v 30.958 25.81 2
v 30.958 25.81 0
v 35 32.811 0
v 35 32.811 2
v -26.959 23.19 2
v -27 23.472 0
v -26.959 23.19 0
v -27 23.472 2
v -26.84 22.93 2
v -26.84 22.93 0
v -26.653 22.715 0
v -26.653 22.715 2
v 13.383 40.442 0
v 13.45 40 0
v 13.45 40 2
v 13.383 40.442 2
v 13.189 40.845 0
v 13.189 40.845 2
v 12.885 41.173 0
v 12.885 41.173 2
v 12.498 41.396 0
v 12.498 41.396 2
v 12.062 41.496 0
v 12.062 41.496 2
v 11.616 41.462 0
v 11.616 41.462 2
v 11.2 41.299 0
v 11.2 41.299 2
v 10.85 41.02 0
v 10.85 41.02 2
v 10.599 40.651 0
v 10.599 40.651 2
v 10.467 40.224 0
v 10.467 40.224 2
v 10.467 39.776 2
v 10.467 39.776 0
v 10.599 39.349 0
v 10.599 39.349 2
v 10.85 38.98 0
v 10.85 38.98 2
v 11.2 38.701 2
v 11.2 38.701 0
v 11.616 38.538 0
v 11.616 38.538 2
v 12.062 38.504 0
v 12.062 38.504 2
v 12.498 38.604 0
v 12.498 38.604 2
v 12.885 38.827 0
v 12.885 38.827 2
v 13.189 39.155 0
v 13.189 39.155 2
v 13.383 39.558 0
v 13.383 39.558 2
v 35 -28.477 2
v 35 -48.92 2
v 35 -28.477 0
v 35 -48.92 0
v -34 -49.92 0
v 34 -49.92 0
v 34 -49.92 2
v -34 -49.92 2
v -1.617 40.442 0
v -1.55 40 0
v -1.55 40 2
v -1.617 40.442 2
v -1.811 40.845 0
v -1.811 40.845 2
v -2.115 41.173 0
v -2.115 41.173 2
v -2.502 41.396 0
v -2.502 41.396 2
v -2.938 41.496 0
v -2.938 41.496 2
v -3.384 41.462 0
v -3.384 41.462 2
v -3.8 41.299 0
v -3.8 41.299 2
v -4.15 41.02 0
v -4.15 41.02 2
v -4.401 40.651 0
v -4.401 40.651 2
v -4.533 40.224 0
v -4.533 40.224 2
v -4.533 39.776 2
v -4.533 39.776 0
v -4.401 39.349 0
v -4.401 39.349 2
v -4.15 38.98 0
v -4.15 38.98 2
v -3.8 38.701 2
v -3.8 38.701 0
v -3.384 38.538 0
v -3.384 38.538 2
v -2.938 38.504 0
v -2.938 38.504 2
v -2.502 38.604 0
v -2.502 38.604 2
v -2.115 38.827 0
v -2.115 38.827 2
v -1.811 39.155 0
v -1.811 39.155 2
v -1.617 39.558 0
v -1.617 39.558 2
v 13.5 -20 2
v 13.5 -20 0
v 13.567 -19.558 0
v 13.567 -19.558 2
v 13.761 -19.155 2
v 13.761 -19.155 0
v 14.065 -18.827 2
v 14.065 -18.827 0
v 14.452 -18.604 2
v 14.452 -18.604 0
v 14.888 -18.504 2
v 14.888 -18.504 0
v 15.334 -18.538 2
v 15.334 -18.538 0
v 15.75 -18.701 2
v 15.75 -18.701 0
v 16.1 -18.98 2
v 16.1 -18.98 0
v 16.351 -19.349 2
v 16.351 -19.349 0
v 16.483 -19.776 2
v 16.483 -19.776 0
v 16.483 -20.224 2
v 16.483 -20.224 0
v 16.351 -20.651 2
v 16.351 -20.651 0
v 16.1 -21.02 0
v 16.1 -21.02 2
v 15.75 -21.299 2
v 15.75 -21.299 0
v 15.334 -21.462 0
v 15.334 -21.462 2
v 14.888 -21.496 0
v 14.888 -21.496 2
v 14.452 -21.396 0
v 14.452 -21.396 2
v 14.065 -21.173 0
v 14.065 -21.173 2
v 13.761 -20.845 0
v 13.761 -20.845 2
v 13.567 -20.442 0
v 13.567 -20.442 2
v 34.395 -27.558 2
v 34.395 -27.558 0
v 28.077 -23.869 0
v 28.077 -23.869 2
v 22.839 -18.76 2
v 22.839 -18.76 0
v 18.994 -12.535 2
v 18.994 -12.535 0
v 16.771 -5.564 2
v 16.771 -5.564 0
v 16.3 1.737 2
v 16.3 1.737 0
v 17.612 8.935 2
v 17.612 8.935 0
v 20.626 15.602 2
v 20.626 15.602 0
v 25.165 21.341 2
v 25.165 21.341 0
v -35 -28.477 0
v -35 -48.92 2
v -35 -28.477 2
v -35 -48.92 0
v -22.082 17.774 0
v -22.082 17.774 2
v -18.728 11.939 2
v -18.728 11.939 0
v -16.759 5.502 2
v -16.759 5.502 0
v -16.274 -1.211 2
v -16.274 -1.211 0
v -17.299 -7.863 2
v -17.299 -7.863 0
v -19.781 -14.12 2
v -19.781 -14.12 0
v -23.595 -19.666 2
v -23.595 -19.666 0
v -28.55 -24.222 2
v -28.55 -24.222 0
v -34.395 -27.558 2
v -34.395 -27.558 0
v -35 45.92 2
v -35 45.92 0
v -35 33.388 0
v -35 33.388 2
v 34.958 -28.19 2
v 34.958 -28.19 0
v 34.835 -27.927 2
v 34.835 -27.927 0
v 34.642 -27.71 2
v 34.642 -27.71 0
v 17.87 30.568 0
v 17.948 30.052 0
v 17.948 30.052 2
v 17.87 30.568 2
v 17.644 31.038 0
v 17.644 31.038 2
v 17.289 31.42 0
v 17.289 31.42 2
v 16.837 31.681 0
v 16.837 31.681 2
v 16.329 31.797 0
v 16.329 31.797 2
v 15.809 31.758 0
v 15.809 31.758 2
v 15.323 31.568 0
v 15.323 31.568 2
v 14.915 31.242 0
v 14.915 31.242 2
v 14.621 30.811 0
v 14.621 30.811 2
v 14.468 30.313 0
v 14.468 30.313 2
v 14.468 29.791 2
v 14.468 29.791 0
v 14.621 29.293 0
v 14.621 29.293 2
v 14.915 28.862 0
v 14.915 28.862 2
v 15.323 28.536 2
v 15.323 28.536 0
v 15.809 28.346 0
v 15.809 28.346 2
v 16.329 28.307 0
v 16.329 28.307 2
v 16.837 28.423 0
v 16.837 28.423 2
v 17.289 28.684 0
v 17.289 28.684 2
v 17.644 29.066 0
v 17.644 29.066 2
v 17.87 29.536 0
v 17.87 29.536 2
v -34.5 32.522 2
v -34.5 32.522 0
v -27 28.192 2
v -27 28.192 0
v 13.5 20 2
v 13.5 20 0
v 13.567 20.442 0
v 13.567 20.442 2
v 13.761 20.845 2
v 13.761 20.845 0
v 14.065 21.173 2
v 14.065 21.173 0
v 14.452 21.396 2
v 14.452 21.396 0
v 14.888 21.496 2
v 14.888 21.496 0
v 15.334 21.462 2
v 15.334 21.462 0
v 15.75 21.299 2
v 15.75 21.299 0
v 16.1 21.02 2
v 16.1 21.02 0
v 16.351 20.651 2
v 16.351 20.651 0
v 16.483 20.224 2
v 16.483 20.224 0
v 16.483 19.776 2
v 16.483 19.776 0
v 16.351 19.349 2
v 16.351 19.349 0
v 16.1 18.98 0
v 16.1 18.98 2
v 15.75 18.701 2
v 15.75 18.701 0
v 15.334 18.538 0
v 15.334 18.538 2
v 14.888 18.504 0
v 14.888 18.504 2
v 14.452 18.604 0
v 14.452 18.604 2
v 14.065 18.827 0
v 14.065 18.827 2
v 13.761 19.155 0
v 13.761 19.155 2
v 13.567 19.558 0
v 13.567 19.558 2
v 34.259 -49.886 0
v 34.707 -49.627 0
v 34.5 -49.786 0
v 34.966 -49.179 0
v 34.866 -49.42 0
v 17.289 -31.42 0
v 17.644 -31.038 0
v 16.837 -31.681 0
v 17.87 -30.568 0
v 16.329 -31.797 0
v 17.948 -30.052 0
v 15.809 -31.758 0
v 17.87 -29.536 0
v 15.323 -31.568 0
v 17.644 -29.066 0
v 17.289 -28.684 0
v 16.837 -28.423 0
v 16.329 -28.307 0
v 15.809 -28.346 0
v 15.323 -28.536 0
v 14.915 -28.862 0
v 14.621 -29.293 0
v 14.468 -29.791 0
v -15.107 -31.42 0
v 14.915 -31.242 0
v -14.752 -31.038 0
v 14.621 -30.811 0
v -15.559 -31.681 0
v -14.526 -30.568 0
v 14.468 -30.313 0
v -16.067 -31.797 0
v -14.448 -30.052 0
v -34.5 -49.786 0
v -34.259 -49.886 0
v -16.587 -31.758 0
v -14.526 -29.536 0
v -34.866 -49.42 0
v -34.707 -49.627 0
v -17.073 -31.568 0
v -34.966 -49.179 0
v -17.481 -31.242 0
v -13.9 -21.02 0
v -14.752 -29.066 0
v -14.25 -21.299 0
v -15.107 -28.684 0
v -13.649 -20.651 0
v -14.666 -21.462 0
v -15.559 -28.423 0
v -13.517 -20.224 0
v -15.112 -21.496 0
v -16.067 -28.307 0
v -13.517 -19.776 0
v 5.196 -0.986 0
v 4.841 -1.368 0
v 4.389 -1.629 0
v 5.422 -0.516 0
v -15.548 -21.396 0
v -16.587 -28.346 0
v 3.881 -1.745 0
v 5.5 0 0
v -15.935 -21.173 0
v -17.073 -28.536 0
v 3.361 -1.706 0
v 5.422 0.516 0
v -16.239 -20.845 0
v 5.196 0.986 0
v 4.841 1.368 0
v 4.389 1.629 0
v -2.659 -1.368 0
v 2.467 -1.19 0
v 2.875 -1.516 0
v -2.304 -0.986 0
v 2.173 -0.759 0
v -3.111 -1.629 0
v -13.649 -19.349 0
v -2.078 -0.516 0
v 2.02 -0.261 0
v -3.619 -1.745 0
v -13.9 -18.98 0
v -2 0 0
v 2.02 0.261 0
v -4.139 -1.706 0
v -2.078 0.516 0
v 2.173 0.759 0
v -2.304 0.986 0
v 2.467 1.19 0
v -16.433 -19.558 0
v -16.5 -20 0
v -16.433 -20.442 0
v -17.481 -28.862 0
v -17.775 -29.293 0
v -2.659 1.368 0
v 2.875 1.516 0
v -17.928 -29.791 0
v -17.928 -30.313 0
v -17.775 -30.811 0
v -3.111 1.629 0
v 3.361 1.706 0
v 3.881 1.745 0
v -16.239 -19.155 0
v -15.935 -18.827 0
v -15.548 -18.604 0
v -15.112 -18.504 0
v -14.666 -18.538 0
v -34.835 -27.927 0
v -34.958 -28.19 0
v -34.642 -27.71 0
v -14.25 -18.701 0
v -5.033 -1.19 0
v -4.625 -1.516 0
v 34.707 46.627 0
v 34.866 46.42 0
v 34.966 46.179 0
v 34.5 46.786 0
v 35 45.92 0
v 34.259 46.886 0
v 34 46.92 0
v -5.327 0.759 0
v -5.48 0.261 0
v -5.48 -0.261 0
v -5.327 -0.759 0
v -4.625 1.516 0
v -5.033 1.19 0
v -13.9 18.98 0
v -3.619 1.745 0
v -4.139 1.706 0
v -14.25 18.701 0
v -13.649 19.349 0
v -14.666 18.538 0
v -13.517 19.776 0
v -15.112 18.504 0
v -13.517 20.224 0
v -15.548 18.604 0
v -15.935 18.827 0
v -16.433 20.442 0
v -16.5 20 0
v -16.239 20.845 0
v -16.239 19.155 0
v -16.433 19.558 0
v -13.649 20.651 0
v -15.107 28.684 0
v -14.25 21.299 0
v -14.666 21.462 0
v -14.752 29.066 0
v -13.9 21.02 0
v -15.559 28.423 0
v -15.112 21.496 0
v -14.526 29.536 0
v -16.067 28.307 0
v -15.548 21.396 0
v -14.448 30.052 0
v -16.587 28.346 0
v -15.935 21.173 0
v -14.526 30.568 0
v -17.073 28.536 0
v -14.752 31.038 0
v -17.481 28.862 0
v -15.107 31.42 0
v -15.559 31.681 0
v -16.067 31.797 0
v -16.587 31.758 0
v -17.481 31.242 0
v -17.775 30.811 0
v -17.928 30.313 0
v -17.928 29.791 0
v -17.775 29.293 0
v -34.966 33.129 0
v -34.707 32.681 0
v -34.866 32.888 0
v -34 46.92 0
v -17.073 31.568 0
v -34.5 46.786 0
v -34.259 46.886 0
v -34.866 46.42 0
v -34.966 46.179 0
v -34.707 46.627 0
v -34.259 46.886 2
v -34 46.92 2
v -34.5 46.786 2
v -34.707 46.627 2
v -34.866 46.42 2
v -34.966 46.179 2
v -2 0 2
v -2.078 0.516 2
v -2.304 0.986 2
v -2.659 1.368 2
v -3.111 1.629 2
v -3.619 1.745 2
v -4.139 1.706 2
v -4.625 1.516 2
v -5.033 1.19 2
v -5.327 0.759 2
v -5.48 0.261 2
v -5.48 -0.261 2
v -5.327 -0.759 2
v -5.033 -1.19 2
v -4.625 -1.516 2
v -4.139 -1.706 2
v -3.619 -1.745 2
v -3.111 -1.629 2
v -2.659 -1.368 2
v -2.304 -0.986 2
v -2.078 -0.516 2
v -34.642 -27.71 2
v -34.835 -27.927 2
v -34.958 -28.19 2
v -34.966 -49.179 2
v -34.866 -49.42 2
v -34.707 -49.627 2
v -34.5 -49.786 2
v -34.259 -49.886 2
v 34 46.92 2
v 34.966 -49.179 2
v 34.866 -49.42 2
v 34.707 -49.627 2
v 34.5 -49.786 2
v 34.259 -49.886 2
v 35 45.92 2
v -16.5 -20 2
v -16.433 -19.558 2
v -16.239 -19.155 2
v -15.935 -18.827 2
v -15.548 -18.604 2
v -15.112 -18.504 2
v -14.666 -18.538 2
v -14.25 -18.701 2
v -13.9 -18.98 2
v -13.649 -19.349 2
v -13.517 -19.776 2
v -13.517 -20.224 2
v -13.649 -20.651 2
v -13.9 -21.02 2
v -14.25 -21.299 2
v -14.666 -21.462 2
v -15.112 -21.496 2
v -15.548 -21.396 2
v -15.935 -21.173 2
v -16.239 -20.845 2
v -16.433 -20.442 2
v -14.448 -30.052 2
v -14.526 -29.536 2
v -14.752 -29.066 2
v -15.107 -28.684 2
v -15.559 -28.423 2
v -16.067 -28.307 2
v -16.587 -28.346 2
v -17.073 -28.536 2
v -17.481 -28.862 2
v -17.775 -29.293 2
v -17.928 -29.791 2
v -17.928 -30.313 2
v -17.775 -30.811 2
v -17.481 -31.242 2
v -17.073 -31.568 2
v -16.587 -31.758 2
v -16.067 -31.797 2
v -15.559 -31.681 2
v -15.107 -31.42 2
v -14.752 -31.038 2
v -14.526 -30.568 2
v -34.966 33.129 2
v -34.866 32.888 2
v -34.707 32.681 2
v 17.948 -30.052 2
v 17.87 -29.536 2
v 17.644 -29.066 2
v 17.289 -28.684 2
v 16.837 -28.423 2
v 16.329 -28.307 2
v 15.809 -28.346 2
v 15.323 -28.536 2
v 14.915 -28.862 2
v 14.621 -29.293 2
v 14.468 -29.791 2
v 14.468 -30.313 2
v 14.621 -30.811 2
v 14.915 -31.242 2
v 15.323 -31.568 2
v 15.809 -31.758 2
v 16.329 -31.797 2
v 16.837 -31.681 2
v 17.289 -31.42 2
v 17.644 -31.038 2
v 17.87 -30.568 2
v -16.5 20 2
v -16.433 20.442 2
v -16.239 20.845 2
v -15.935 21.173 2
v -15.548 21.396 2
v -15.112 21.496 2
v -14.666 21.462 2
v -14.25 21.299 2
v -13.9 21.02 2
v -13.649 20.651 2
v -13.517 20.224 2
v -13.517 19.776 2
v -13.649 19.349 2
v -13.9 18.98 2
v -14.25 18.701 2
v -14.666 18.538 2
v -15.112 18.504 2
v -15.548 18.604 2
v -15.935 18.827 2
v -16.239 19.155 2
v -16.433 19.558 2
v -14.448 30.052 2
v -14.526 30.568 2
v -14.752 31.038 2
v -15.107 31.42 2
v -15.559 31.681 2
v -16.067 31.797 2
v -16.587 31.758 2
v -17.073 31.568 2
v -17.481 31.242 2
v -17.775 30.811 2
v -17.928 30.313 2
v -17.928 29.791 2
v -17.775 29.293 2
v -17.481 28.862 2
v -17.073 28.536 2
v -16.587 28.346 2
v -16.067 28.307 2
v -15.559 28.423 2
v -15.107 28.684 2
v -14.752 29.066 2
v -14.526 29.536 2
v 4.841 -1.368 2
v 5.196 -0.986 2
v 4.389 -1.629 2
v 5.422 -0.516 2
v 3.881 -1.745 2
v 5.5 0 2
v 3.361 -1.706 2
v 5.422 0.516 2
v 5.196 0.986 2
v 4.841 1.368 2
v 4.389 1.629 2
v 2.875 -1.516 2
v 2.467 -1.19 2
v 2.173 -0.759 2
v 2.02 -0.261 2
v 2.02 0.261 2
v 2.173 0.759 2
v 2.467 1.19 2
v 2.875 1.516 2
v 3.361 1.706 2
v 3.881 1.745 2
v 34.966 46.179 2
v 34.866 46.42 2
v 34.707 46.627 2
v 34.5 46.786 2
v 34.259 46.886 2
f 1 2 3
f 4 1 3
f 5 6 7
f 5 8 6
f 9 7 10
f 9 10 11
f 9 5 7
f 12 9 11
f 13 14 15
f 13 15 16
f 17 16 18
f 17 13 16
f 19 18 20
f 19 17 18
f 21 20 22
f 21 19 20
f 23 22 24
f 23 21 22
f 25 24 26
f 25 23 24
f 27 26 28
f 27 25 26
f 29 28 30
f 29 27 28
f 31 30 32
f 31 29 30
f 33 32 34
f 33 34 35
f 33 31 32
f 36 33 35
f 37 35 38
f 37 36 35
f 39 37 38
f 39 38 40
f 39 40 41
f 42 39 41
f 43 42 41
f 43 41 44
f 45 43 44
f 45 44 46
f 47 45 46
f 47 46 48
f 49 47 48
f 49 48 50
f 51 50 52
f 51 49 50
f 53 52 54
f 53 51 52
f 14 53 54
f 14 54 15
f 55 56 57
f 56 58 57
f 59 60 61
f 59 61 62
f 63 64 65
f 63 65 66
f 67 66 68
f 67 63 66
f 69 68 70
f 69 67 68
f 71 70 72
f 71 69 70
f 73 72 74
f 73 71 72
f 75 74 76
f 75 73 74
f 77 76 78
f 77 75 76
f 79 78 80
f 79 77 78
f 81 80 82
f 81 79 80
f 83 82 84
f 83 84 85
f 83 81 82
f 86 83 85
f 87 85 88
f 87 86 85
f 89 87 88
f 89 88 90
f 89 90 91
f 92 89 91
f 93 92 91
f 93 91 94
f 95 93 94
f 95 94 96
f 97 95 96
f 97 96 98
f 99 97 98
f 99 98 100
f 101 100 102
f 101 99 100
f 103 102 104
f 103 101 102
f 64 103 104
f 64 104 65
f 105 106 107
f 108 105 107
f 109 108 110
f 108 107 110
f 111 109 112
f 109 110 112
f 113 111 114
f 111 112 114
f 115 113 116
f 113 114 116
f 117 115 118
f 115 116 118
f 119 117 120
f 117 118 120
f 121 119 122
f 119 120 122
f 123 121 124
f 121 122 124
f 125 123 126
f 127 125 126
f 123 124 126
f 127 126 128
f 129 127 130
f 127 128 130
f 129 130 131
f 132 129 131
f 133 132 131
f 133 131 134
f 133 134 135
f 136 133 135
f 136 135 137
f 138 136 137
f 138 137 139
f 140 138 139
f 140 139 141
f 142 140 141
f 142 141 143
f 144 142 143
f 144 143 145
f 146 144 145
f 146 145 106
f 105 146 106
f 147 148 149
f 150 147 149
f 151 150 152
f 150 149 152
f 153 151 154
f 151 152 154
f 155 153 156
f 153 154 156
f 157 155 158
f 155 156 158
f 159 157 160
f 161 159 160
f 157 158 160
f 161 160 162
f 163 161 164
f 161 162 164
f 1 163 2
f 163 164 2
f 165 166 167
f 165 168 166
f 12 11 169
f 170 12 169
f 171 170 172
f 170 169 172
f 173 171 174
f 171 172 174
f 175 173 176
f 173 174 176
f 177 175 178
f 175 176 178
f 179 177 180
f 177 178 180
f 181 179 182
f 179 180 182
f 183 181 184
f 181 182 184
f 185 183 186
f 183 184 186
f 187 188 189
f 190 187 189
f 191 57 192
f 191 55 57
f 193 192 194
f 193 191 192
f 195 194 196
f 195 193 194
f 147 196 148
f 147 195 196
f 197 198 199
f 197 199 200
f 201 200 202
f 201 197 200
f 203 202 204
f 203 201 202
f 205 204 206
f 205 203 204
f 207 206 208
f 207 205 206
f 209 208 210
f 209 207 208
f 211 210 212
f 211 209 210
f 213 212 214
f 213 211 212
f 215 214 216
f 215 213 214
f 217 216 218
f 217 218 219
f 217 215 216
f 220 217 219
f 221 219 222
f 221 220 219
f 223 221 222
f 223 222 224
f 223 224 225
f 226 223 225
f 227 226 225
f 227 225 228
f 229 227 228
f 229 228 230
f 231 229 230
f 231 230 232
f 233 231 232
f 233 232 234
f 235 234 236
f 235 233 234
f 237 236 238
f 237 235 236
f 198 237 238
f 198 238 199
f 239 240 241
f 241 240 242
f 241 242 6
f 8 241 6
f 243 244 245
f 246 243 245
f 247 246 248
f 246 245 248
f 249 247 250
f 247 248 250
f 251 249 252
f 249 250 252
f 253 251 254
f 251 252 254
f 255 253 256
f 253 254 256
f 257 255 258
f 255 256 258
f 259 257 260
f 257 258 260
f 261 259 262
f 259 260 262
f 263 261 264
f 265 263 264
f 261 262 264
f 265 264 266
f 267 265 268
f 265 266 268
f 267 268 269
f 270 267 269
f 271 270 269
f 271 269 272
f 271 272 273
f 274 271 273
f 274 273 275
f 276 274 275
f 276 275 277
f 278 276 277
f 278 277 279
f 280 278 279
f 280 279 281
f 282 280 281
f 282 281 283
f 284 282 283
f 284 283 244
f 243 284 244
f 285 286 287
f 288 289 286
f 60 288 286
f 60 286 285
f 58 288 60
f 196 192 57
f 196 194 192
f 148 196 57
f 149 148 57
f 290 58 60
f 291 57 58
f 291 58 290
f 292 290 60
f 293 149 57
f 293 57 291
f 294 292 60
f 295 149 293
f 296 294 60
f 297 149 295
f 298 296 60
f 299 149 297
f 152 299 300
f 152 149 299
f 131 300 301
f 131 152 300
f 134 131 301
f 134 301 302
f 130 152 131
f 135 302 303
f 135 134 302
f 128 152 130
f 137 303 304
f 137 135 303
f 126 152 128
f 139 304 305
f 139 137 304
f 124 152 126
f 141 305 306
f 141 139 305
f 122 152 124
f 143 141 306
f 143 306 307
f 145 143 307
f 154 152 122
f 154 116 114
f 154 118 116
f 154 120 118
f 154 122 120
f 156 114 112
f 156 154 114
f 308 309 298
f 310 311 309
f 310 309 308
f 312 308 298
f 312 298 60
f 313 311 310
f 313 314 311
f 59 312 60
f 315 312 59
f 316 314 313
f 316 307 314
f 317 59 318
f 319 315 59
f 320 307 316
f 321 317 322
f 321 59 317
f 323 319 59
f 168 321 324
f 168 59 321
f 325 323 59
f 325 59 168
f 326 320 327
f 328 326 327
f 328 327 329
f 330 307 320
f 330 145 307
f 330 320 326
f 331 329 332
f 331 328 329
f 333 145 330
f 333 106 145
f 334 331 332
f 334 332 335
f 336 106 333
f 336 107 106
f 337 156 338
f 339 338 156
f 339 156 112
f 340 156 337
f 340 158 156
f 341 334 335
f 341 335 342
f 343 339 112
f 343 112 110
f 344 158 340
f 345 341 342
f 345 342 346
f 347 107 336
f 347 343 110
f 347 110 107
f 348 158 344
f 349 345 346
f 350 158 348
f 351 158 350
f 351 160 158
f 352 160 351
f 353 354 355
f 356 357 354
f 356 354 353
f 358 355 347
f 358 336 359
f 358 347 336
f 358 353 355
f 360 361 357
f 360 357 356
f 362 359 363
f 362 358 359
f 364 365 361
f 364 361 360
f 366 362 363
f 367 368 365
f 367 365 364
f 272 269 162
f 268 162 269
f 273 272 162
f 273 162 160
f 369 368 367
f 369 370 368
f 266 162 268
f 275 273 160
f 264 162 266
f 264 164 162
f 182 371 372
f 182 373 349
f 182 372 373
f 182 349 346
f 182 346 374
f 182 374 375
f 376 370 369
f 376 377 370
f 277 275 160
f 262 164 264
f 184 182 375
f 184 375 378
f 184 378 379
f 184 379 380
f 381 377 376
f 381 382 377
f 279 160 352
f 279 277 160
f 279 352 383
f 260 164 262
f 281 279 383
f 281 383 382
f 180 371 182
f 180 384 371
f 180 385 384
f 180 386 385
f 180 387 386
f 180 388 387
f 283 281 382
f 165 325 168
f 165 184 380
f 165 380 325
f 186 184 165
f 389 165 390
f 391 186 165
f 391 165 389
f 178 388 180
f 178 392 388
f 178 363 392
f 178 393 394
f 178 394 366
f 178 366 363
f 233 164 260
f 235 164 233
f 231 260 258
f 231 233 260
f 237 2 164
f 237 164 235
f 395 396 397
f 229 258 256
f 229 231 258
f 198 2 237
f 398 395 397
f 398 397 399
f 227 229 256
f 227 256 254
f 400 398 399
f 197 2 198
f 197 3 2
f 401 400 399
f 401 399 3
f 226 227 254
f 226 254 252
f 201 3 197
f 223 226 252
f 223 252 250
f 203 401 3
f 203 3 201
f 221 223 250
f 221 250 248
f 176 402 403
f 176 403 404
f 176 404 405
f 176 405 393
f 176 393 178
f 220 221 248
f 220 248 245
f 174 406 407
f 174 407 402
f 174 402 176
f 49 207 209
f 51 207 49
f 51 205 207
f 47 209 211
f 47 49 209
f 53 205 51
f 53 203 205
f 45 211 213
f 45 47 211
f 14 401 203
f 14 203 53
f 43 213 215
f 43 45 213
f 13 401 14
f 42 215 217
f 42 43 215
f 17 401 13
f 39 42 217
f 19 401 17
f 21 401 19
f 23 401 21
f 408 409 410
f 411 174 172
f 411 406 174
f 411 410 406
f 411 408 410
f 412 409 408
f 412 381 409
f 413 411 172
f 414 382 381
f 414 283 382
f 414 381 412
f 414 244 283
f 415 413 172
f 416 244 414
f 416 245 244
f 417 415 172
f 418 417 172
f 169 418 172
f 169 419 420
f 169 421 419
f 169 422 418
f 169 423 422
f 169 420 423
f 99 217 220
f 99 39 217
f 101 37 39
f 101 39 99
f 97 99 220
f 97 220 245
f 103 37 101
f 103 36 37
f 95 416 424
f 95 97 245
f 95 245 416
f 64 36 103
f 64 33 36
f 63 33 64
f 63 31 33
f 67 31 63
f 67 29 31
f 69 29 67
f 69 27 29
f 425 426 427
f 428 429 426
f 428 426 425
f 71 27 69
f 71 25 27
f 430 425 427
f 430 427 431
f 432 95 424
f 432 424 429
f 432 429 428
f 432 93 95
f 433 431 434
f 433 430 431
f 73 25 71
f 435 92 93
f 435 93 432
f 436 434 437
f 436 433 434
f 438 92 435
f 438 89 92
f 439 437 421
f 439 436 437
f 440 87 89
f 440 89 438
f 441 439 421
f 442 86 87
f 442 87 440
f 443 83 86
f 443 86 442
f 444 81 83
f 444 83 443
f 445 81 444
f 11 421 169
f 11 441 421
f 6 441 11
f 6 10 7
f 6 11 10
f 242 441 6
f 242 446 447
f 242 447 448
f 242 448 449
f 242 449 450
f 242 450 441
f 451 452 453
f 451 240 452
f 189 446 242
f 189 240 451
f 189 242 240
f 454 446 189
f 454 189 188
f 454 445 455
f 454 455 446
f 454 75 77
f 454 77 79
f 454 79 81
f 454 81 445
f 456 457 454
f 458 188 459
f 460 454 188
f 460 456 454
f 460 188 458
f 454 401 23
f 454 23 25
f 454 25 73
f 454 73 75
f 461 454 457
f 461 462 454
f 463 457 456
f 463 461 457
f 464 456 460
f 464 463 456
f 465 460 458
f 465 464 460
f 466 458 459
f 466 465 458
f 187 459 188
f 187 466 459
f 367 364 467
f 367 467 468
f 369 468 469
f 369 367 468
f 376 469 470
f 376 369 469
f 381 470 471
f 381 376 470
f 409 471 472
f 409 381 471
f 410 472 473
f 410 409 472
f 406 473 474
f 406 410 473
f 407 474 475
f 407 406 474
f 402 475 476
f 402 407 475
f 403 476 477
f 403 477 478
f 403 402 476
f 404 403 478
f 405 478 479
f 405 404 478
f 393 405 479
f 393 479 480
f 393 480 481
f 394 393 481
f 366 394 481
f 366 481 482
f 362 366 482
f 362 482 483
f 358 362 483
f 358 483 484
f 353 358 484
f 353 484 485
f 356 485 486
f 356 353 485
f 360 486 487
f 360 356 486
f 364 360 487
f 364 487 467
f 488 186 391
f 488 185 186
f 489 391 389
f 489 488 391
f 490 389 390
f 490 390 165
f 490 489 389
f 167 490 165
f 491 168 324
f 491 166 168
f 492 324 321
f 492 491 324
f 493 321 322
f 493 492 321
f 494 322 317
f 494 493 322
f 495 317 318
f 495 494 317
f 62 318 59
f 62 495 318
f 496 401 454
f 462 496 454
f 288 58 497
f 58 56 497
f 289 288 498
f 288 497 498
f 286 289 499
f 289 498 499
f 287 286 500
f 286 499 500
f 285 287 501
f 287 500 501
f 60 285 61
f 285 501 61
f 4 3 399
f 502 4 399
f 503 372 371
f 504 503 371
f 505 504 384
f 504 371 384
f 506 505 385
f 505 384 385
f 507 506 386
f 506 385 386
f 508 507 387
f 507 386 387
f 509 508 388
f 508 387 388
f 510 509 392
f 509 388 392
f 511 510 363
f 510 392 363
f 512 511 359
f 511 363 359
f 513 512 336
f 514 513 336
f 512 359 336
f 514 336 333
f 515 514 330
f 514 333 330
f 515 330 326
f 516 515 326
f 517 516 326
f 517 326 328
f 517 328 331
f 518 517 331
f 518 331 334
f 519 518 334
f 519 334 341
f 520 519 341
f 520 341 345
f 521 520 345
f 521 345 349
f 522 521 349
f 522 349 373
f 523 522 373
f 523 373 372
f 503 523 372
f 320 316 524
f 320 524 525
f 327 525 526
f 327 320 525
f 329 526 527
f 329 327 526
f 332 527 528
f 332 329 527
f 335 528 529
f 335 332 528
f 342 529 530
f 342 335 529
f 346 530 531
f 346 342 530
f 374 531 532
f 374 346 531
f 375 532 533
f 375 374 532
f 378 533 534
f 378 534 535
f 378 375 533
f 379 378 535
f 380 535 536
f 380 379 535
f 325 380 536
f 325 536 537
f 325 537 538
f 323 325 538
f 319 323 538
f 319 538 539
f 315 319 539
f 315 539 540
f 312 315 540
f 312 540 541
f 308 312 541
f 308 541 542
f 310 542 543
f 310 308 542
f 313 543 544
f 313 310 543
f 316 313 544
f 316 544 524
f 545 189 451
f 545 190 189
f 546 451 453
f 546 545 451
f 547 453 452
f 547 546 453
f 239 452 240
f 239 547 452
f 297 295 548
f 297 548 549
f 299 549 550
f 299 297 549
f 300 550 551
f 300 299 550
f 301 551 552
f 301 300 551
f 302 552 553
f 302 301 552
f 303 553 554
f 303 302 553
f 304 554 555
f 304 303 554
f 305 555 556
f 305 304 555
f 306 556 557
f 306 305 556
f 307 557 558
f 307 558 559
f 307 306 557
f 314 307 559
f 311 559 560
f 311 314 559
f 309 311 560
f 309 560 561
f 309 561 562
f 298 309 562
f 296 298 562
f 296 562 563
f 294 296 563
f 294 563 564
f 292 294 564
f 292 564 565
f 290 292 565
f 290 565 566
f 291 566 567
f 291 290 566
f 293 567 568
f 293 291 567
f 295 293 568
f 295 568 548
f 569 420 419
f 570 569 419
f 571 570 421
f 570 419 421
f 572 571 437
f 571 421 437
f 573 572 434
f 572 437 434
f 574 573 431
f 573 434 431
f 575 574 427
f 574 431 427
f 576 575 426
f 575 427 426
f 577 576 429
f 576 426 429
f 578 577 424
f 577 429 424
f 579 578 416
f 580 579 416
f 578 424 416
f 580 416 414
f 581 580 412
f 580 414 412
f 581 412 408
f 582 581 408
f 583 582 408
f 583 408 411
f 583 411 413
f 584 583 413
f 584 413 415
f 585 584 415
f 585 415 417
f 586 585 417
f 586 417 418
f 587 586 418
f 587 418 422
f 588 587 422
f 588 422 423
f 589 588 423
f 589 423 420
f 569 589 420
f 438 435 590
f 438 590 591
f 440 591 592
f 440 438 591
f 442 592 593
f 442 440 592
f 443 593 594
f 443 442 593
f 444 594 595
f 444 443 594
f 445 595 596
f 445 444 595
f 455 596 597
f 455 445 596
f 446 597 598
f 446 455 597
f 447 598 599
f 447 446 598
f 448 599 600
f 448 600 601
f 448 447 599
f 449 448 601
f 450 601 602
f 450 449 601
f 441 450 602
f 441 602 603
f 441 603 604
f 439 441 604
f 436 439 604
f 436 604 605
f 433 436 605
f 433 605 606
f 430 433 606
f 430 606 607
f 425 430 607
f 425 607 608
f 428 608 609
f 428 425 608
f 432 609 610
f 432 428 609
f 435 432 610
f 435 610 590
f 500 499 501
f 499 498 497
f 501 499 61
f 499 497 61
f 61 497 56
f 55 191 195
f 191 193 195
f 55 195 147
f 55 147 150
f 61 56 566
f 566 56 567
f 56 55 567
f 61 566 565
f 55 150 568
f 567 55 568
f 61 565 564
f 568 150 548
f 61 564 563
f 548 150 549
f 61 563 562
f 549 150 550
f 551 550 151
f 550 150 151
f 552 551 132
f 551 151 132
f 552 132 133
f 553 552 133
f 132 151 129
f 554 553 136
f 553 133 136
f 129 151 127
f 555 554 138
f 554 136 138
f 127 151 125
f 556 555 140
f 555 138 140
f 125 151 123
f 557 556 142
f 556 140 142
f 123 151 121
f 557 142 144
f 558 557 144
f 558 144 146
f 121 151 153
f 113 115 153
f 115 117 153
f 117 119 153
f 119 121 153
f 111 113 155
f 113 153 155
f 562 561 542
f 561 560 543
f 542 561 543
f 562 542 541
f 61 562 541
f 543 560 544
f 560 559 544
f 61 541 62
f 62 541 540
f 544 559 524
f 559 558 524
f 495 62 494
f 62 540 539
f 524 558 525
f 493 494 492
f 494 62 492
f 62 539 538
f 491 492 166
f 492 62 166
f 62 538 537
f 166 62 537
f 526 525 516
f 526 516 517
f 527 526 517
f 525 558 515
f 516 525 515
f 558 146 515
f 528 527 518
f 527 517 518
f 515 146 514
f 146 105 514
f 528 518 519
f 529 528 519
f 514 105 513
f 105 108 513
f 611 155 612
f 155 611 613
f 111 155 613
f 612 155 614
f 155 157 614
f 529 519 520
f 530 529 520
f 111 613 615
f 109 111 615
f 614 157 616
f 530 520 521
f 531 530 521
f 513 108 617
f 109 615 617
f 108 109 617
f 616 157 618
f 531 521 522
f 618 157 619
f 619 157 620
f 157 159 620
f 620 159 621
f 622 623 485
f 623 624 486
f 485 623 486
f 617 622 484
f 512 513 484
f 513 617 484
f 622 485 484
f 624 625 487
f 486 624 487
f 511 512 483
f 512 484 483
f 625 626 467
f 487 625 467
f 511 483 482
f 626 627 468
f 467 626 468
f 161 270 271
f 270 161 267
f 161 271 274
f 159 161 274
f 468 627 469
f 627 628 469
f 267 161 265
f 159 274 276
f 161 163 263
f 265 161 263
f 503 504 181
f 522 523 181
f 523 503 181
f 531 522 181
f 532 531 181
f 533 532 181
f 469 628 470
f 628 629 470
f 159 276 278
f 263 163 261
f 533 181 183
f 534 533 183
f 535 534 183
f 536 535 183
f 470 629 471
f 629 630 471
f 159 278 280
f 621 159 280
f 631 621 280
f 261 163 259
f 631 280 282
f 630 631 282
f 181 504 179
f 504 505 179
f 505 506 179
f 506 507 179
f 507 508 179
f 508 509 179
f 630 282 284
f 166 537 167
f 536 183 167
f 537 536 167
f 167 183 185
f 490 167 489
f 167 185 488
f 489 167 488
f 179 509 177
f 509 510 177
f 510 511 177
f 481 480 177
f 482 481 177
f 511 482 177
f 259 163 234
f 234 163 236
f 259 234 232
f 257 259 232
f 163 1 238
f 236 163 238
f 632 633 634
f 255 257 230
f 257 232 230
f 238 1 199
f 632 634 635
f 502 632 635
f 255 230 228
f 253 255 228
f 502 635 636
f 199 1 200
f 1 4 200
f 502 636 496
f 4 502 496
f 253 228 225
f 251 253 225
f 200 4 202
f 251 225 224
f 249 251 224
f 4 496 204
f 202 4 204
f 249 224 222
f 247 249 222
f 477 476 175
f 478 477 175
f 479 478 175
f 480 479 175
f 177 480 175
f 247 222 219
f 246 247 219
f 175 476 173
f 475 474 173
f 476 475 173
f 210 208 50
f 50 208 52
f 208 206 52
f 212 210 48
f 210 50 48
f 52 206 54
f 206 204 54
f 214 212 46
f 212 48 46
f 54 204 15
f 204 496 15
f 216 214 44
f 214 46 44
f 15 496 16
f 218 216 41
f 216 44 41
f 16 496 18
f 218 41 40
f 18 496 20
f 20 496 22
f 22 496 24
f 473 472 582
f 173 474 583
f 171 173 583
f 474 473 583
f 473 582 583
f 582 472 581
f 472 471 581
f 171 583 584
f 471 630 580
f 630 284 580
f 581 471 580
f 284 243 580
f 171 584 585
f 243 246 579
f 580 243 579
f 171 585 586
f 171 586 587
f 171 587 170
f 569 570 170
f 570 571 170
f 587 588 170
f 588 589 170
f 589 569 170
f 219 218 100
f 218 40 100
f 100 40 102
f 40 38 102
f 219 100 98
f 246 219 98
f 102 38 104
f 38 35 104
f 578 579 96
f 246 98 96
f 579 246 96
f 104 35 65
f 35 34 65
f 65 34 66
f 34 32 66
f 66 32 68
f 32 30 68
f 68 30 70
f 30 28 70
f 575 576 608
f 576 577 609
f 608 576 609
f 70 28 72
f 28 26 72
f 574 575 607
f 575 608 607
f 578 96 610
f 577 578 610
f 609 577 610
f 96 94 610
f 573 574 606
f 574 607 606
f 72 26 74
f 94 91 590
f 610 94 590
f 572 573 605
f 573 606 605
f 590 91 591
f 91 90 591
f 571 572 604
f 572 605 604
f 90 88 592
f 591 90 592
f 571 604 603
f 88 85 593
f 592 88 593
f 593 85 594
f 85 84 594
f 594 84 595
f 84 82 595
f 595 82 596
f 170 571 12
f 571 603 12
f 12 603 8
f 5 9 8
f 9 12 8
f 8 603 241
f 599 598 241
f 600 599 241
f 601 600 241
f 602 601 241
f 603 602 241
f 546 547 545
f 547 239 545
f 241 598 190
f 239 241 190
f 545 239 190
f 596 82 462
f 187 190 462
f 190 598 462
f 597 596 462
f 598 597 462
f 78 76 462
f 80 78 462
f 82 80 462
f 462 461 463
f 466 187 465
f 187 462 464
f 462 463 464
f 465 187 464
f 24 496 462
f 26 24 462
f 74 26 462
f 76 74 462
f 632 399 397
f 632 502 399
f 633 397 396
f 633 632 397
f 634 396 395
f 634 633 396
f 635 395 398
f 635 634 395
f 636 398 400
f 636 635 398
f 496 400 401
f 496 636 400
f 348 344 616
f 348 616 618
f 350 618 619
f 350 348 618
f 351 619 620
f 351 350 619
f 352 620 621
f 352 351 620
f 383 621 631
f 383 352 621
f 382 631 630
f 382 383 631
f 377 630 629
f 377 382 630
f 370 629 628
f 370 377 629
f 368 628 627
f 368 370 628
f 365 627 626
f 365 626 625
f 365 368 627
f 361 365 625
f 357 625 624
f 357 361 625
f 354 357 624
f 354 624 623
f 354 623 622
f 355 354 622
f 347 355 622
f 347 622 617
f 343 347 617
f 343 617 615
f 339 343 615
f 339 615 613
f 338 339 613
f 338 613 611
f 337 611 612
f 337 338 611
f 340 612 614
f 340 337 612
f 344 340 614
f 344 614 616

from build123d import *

# Parameters (mm, degrees)
SKETCH_1_R          = 1.75
SKETCH_1_R_2        = 1.5
EXTRUDE_1_DEPTH     = 2
SKETCH_2_W          = 27.7
SKETCH_2_H          = 5
CUT_EXTRUDE_1_DEPTH = 10
SKETCH_3_R          = 1.5
CUT_EXTRUDE_2_DEPTH = 10
SKETCH_4_W          = 70
SKETCH_4_H          = 3
EXTRUDE_2_DEPTH     = 2
FILLET_1_R          = 1


with BuildPart() as part:
    # 草图1 → 凸台-拉伸1 (new body)
    with BuildSketch(Plane.XY):
        with BuildLine():
            Line((-35, -27.810744327), (-35, -46.920144927))
            Line((-35, -46.920144927), (35, -46.920144927))
            Line((35, -46.920144927), (35, -27.810744327))
            ThreePointArc((35, -27.810744327), (16.334866743, -2.254950607), (30.958156738, 25.81006644))
            Line((30.958156738, 25.81006644), (35, 32.810744327))
            Line((35, 32.810744327), (35, 46.920144927))
            Line((35, 46.920144927), (16.8, 46.920144927))
            Line((16.8, 46.920144927), (16.8, 51.920144927))
            Line((16.8, 51.920144927), (-10.9, 51.920144927))
            Line((-10.9, 51.920144927), (-10.9, 46.920144927))
            Line((-10.9, 46.920144927), (-35, 46.920144927))
            Line((-35, 46.920144927), (-35, 32.810744327))
            Line((-35, 32.810744327), (-27, 28.191942173))
            Line((-27, 28.191942173), (-27, 23.009508904))
            ThreePointArc((-27, 23.009508904), (-16.614935725, -4.665079356), (-35, -27.810744327))
        make_face()
        with Locations((-16.1979618, -30.0520382)):
            Circle(SKETCH_1_R, mode=Mode.SUBTRACT)
        with Locations((-3.75, 0)):
            Circle(SKETCH_1_R, mode=Mode.SUBTRACT)
        with Locations((16.1979618, -30.0520382)):
            Circle(SKETCH_1_R, mode=Mode.SUBTRACT)
        with Locations((3.75, 0)):
            Circle(SKETCH_1_R, mode=Mode.SUBTRACT)
        with Locations((-16.1979618, 30.0520382)):
            Circle(SKETCH_1_R, mode=Mode.SUBTRACT)
        with Locations((-3.05, 40)):
            Circle(SKETCH_1_R_2, mode=Mode.SUBTRACT)
        with Locations((16.1979618, 30.0520382)):
            Circle(SKETCH_1_R, mode=Mode.SUBTRACT)
        with Locations((11.95, 40)):
            Circle(SKETCH_1_R_2, mode=Mode.SUBTRACT)
    extrude(amount=EXTRUDE_1_DEPTH)

    # 草图2 → 切除-拉伸1 (cut)
    with BuildSketch(Plane(origin=(0, 0, 0), x_dir=(-1, 0, 0), z_dir=(0, 0, -1))):
        with Locations((-2.95, 49.420144927)):
            Rectangle(SKETCH_2_W, SKETCH_2_H)
    extrude(amount=-CUT_EXTRUDE_1_DEPTH, mode=Mode.SUBTRACT)

    # 草图3 → 切除-拉伸2 (cut)
    with BuildSketch(Plane(origin=(0, 0, 0), x_dir=(-1, 0, 0), z_dir=(0, 0, -1))):
        with Locations((-15, 20)):
            Circle(SKETCH_3_R)
        with Locations((15, 20)):
            Circle(SKETCH_3_R)
        with Locations((15, -20)):
            Circle(SKETCH_3_R)
        with Locations((-15, -20)):
            Circle(SKETCH_3_R)
    extrude(amount=-CUT_EXTRUDE_2_DEPTH, mode=Mode.SUBTRACT)

    # 草图4 → 凸台-拉伸2 (add)
    with BuildSketch(Plane(origin=(0, 0, 0), x_dir=(-1, 0, 0), z_dir=(0, 0, -1))):
        with Locations((0, -48.420144927)):
            Rectangle(SKETCH_4_W, SKETCH_4_H)
    extrude(amount=-EXTRUDE_2_DEPTH)

    # 圆角1
    fillet_1_edges = [part.edges().sort_by_distance(p)[0] for p in [
        (35, -49.920144927, 1),
        (-35, -49.920144927, 1),
        (35, -27.810744327, 1),
        (-35, -27.810744327, 1),
        (-27, 23.009508904, 1),
        (-35, 32.810744327, 1),
        (-35, 46.920144927, 1),
        (35, 46.920144927, 1),
    ]]
    fillet(fillet_1_edges, radius=FILLET_1_R)


solid = part.part
